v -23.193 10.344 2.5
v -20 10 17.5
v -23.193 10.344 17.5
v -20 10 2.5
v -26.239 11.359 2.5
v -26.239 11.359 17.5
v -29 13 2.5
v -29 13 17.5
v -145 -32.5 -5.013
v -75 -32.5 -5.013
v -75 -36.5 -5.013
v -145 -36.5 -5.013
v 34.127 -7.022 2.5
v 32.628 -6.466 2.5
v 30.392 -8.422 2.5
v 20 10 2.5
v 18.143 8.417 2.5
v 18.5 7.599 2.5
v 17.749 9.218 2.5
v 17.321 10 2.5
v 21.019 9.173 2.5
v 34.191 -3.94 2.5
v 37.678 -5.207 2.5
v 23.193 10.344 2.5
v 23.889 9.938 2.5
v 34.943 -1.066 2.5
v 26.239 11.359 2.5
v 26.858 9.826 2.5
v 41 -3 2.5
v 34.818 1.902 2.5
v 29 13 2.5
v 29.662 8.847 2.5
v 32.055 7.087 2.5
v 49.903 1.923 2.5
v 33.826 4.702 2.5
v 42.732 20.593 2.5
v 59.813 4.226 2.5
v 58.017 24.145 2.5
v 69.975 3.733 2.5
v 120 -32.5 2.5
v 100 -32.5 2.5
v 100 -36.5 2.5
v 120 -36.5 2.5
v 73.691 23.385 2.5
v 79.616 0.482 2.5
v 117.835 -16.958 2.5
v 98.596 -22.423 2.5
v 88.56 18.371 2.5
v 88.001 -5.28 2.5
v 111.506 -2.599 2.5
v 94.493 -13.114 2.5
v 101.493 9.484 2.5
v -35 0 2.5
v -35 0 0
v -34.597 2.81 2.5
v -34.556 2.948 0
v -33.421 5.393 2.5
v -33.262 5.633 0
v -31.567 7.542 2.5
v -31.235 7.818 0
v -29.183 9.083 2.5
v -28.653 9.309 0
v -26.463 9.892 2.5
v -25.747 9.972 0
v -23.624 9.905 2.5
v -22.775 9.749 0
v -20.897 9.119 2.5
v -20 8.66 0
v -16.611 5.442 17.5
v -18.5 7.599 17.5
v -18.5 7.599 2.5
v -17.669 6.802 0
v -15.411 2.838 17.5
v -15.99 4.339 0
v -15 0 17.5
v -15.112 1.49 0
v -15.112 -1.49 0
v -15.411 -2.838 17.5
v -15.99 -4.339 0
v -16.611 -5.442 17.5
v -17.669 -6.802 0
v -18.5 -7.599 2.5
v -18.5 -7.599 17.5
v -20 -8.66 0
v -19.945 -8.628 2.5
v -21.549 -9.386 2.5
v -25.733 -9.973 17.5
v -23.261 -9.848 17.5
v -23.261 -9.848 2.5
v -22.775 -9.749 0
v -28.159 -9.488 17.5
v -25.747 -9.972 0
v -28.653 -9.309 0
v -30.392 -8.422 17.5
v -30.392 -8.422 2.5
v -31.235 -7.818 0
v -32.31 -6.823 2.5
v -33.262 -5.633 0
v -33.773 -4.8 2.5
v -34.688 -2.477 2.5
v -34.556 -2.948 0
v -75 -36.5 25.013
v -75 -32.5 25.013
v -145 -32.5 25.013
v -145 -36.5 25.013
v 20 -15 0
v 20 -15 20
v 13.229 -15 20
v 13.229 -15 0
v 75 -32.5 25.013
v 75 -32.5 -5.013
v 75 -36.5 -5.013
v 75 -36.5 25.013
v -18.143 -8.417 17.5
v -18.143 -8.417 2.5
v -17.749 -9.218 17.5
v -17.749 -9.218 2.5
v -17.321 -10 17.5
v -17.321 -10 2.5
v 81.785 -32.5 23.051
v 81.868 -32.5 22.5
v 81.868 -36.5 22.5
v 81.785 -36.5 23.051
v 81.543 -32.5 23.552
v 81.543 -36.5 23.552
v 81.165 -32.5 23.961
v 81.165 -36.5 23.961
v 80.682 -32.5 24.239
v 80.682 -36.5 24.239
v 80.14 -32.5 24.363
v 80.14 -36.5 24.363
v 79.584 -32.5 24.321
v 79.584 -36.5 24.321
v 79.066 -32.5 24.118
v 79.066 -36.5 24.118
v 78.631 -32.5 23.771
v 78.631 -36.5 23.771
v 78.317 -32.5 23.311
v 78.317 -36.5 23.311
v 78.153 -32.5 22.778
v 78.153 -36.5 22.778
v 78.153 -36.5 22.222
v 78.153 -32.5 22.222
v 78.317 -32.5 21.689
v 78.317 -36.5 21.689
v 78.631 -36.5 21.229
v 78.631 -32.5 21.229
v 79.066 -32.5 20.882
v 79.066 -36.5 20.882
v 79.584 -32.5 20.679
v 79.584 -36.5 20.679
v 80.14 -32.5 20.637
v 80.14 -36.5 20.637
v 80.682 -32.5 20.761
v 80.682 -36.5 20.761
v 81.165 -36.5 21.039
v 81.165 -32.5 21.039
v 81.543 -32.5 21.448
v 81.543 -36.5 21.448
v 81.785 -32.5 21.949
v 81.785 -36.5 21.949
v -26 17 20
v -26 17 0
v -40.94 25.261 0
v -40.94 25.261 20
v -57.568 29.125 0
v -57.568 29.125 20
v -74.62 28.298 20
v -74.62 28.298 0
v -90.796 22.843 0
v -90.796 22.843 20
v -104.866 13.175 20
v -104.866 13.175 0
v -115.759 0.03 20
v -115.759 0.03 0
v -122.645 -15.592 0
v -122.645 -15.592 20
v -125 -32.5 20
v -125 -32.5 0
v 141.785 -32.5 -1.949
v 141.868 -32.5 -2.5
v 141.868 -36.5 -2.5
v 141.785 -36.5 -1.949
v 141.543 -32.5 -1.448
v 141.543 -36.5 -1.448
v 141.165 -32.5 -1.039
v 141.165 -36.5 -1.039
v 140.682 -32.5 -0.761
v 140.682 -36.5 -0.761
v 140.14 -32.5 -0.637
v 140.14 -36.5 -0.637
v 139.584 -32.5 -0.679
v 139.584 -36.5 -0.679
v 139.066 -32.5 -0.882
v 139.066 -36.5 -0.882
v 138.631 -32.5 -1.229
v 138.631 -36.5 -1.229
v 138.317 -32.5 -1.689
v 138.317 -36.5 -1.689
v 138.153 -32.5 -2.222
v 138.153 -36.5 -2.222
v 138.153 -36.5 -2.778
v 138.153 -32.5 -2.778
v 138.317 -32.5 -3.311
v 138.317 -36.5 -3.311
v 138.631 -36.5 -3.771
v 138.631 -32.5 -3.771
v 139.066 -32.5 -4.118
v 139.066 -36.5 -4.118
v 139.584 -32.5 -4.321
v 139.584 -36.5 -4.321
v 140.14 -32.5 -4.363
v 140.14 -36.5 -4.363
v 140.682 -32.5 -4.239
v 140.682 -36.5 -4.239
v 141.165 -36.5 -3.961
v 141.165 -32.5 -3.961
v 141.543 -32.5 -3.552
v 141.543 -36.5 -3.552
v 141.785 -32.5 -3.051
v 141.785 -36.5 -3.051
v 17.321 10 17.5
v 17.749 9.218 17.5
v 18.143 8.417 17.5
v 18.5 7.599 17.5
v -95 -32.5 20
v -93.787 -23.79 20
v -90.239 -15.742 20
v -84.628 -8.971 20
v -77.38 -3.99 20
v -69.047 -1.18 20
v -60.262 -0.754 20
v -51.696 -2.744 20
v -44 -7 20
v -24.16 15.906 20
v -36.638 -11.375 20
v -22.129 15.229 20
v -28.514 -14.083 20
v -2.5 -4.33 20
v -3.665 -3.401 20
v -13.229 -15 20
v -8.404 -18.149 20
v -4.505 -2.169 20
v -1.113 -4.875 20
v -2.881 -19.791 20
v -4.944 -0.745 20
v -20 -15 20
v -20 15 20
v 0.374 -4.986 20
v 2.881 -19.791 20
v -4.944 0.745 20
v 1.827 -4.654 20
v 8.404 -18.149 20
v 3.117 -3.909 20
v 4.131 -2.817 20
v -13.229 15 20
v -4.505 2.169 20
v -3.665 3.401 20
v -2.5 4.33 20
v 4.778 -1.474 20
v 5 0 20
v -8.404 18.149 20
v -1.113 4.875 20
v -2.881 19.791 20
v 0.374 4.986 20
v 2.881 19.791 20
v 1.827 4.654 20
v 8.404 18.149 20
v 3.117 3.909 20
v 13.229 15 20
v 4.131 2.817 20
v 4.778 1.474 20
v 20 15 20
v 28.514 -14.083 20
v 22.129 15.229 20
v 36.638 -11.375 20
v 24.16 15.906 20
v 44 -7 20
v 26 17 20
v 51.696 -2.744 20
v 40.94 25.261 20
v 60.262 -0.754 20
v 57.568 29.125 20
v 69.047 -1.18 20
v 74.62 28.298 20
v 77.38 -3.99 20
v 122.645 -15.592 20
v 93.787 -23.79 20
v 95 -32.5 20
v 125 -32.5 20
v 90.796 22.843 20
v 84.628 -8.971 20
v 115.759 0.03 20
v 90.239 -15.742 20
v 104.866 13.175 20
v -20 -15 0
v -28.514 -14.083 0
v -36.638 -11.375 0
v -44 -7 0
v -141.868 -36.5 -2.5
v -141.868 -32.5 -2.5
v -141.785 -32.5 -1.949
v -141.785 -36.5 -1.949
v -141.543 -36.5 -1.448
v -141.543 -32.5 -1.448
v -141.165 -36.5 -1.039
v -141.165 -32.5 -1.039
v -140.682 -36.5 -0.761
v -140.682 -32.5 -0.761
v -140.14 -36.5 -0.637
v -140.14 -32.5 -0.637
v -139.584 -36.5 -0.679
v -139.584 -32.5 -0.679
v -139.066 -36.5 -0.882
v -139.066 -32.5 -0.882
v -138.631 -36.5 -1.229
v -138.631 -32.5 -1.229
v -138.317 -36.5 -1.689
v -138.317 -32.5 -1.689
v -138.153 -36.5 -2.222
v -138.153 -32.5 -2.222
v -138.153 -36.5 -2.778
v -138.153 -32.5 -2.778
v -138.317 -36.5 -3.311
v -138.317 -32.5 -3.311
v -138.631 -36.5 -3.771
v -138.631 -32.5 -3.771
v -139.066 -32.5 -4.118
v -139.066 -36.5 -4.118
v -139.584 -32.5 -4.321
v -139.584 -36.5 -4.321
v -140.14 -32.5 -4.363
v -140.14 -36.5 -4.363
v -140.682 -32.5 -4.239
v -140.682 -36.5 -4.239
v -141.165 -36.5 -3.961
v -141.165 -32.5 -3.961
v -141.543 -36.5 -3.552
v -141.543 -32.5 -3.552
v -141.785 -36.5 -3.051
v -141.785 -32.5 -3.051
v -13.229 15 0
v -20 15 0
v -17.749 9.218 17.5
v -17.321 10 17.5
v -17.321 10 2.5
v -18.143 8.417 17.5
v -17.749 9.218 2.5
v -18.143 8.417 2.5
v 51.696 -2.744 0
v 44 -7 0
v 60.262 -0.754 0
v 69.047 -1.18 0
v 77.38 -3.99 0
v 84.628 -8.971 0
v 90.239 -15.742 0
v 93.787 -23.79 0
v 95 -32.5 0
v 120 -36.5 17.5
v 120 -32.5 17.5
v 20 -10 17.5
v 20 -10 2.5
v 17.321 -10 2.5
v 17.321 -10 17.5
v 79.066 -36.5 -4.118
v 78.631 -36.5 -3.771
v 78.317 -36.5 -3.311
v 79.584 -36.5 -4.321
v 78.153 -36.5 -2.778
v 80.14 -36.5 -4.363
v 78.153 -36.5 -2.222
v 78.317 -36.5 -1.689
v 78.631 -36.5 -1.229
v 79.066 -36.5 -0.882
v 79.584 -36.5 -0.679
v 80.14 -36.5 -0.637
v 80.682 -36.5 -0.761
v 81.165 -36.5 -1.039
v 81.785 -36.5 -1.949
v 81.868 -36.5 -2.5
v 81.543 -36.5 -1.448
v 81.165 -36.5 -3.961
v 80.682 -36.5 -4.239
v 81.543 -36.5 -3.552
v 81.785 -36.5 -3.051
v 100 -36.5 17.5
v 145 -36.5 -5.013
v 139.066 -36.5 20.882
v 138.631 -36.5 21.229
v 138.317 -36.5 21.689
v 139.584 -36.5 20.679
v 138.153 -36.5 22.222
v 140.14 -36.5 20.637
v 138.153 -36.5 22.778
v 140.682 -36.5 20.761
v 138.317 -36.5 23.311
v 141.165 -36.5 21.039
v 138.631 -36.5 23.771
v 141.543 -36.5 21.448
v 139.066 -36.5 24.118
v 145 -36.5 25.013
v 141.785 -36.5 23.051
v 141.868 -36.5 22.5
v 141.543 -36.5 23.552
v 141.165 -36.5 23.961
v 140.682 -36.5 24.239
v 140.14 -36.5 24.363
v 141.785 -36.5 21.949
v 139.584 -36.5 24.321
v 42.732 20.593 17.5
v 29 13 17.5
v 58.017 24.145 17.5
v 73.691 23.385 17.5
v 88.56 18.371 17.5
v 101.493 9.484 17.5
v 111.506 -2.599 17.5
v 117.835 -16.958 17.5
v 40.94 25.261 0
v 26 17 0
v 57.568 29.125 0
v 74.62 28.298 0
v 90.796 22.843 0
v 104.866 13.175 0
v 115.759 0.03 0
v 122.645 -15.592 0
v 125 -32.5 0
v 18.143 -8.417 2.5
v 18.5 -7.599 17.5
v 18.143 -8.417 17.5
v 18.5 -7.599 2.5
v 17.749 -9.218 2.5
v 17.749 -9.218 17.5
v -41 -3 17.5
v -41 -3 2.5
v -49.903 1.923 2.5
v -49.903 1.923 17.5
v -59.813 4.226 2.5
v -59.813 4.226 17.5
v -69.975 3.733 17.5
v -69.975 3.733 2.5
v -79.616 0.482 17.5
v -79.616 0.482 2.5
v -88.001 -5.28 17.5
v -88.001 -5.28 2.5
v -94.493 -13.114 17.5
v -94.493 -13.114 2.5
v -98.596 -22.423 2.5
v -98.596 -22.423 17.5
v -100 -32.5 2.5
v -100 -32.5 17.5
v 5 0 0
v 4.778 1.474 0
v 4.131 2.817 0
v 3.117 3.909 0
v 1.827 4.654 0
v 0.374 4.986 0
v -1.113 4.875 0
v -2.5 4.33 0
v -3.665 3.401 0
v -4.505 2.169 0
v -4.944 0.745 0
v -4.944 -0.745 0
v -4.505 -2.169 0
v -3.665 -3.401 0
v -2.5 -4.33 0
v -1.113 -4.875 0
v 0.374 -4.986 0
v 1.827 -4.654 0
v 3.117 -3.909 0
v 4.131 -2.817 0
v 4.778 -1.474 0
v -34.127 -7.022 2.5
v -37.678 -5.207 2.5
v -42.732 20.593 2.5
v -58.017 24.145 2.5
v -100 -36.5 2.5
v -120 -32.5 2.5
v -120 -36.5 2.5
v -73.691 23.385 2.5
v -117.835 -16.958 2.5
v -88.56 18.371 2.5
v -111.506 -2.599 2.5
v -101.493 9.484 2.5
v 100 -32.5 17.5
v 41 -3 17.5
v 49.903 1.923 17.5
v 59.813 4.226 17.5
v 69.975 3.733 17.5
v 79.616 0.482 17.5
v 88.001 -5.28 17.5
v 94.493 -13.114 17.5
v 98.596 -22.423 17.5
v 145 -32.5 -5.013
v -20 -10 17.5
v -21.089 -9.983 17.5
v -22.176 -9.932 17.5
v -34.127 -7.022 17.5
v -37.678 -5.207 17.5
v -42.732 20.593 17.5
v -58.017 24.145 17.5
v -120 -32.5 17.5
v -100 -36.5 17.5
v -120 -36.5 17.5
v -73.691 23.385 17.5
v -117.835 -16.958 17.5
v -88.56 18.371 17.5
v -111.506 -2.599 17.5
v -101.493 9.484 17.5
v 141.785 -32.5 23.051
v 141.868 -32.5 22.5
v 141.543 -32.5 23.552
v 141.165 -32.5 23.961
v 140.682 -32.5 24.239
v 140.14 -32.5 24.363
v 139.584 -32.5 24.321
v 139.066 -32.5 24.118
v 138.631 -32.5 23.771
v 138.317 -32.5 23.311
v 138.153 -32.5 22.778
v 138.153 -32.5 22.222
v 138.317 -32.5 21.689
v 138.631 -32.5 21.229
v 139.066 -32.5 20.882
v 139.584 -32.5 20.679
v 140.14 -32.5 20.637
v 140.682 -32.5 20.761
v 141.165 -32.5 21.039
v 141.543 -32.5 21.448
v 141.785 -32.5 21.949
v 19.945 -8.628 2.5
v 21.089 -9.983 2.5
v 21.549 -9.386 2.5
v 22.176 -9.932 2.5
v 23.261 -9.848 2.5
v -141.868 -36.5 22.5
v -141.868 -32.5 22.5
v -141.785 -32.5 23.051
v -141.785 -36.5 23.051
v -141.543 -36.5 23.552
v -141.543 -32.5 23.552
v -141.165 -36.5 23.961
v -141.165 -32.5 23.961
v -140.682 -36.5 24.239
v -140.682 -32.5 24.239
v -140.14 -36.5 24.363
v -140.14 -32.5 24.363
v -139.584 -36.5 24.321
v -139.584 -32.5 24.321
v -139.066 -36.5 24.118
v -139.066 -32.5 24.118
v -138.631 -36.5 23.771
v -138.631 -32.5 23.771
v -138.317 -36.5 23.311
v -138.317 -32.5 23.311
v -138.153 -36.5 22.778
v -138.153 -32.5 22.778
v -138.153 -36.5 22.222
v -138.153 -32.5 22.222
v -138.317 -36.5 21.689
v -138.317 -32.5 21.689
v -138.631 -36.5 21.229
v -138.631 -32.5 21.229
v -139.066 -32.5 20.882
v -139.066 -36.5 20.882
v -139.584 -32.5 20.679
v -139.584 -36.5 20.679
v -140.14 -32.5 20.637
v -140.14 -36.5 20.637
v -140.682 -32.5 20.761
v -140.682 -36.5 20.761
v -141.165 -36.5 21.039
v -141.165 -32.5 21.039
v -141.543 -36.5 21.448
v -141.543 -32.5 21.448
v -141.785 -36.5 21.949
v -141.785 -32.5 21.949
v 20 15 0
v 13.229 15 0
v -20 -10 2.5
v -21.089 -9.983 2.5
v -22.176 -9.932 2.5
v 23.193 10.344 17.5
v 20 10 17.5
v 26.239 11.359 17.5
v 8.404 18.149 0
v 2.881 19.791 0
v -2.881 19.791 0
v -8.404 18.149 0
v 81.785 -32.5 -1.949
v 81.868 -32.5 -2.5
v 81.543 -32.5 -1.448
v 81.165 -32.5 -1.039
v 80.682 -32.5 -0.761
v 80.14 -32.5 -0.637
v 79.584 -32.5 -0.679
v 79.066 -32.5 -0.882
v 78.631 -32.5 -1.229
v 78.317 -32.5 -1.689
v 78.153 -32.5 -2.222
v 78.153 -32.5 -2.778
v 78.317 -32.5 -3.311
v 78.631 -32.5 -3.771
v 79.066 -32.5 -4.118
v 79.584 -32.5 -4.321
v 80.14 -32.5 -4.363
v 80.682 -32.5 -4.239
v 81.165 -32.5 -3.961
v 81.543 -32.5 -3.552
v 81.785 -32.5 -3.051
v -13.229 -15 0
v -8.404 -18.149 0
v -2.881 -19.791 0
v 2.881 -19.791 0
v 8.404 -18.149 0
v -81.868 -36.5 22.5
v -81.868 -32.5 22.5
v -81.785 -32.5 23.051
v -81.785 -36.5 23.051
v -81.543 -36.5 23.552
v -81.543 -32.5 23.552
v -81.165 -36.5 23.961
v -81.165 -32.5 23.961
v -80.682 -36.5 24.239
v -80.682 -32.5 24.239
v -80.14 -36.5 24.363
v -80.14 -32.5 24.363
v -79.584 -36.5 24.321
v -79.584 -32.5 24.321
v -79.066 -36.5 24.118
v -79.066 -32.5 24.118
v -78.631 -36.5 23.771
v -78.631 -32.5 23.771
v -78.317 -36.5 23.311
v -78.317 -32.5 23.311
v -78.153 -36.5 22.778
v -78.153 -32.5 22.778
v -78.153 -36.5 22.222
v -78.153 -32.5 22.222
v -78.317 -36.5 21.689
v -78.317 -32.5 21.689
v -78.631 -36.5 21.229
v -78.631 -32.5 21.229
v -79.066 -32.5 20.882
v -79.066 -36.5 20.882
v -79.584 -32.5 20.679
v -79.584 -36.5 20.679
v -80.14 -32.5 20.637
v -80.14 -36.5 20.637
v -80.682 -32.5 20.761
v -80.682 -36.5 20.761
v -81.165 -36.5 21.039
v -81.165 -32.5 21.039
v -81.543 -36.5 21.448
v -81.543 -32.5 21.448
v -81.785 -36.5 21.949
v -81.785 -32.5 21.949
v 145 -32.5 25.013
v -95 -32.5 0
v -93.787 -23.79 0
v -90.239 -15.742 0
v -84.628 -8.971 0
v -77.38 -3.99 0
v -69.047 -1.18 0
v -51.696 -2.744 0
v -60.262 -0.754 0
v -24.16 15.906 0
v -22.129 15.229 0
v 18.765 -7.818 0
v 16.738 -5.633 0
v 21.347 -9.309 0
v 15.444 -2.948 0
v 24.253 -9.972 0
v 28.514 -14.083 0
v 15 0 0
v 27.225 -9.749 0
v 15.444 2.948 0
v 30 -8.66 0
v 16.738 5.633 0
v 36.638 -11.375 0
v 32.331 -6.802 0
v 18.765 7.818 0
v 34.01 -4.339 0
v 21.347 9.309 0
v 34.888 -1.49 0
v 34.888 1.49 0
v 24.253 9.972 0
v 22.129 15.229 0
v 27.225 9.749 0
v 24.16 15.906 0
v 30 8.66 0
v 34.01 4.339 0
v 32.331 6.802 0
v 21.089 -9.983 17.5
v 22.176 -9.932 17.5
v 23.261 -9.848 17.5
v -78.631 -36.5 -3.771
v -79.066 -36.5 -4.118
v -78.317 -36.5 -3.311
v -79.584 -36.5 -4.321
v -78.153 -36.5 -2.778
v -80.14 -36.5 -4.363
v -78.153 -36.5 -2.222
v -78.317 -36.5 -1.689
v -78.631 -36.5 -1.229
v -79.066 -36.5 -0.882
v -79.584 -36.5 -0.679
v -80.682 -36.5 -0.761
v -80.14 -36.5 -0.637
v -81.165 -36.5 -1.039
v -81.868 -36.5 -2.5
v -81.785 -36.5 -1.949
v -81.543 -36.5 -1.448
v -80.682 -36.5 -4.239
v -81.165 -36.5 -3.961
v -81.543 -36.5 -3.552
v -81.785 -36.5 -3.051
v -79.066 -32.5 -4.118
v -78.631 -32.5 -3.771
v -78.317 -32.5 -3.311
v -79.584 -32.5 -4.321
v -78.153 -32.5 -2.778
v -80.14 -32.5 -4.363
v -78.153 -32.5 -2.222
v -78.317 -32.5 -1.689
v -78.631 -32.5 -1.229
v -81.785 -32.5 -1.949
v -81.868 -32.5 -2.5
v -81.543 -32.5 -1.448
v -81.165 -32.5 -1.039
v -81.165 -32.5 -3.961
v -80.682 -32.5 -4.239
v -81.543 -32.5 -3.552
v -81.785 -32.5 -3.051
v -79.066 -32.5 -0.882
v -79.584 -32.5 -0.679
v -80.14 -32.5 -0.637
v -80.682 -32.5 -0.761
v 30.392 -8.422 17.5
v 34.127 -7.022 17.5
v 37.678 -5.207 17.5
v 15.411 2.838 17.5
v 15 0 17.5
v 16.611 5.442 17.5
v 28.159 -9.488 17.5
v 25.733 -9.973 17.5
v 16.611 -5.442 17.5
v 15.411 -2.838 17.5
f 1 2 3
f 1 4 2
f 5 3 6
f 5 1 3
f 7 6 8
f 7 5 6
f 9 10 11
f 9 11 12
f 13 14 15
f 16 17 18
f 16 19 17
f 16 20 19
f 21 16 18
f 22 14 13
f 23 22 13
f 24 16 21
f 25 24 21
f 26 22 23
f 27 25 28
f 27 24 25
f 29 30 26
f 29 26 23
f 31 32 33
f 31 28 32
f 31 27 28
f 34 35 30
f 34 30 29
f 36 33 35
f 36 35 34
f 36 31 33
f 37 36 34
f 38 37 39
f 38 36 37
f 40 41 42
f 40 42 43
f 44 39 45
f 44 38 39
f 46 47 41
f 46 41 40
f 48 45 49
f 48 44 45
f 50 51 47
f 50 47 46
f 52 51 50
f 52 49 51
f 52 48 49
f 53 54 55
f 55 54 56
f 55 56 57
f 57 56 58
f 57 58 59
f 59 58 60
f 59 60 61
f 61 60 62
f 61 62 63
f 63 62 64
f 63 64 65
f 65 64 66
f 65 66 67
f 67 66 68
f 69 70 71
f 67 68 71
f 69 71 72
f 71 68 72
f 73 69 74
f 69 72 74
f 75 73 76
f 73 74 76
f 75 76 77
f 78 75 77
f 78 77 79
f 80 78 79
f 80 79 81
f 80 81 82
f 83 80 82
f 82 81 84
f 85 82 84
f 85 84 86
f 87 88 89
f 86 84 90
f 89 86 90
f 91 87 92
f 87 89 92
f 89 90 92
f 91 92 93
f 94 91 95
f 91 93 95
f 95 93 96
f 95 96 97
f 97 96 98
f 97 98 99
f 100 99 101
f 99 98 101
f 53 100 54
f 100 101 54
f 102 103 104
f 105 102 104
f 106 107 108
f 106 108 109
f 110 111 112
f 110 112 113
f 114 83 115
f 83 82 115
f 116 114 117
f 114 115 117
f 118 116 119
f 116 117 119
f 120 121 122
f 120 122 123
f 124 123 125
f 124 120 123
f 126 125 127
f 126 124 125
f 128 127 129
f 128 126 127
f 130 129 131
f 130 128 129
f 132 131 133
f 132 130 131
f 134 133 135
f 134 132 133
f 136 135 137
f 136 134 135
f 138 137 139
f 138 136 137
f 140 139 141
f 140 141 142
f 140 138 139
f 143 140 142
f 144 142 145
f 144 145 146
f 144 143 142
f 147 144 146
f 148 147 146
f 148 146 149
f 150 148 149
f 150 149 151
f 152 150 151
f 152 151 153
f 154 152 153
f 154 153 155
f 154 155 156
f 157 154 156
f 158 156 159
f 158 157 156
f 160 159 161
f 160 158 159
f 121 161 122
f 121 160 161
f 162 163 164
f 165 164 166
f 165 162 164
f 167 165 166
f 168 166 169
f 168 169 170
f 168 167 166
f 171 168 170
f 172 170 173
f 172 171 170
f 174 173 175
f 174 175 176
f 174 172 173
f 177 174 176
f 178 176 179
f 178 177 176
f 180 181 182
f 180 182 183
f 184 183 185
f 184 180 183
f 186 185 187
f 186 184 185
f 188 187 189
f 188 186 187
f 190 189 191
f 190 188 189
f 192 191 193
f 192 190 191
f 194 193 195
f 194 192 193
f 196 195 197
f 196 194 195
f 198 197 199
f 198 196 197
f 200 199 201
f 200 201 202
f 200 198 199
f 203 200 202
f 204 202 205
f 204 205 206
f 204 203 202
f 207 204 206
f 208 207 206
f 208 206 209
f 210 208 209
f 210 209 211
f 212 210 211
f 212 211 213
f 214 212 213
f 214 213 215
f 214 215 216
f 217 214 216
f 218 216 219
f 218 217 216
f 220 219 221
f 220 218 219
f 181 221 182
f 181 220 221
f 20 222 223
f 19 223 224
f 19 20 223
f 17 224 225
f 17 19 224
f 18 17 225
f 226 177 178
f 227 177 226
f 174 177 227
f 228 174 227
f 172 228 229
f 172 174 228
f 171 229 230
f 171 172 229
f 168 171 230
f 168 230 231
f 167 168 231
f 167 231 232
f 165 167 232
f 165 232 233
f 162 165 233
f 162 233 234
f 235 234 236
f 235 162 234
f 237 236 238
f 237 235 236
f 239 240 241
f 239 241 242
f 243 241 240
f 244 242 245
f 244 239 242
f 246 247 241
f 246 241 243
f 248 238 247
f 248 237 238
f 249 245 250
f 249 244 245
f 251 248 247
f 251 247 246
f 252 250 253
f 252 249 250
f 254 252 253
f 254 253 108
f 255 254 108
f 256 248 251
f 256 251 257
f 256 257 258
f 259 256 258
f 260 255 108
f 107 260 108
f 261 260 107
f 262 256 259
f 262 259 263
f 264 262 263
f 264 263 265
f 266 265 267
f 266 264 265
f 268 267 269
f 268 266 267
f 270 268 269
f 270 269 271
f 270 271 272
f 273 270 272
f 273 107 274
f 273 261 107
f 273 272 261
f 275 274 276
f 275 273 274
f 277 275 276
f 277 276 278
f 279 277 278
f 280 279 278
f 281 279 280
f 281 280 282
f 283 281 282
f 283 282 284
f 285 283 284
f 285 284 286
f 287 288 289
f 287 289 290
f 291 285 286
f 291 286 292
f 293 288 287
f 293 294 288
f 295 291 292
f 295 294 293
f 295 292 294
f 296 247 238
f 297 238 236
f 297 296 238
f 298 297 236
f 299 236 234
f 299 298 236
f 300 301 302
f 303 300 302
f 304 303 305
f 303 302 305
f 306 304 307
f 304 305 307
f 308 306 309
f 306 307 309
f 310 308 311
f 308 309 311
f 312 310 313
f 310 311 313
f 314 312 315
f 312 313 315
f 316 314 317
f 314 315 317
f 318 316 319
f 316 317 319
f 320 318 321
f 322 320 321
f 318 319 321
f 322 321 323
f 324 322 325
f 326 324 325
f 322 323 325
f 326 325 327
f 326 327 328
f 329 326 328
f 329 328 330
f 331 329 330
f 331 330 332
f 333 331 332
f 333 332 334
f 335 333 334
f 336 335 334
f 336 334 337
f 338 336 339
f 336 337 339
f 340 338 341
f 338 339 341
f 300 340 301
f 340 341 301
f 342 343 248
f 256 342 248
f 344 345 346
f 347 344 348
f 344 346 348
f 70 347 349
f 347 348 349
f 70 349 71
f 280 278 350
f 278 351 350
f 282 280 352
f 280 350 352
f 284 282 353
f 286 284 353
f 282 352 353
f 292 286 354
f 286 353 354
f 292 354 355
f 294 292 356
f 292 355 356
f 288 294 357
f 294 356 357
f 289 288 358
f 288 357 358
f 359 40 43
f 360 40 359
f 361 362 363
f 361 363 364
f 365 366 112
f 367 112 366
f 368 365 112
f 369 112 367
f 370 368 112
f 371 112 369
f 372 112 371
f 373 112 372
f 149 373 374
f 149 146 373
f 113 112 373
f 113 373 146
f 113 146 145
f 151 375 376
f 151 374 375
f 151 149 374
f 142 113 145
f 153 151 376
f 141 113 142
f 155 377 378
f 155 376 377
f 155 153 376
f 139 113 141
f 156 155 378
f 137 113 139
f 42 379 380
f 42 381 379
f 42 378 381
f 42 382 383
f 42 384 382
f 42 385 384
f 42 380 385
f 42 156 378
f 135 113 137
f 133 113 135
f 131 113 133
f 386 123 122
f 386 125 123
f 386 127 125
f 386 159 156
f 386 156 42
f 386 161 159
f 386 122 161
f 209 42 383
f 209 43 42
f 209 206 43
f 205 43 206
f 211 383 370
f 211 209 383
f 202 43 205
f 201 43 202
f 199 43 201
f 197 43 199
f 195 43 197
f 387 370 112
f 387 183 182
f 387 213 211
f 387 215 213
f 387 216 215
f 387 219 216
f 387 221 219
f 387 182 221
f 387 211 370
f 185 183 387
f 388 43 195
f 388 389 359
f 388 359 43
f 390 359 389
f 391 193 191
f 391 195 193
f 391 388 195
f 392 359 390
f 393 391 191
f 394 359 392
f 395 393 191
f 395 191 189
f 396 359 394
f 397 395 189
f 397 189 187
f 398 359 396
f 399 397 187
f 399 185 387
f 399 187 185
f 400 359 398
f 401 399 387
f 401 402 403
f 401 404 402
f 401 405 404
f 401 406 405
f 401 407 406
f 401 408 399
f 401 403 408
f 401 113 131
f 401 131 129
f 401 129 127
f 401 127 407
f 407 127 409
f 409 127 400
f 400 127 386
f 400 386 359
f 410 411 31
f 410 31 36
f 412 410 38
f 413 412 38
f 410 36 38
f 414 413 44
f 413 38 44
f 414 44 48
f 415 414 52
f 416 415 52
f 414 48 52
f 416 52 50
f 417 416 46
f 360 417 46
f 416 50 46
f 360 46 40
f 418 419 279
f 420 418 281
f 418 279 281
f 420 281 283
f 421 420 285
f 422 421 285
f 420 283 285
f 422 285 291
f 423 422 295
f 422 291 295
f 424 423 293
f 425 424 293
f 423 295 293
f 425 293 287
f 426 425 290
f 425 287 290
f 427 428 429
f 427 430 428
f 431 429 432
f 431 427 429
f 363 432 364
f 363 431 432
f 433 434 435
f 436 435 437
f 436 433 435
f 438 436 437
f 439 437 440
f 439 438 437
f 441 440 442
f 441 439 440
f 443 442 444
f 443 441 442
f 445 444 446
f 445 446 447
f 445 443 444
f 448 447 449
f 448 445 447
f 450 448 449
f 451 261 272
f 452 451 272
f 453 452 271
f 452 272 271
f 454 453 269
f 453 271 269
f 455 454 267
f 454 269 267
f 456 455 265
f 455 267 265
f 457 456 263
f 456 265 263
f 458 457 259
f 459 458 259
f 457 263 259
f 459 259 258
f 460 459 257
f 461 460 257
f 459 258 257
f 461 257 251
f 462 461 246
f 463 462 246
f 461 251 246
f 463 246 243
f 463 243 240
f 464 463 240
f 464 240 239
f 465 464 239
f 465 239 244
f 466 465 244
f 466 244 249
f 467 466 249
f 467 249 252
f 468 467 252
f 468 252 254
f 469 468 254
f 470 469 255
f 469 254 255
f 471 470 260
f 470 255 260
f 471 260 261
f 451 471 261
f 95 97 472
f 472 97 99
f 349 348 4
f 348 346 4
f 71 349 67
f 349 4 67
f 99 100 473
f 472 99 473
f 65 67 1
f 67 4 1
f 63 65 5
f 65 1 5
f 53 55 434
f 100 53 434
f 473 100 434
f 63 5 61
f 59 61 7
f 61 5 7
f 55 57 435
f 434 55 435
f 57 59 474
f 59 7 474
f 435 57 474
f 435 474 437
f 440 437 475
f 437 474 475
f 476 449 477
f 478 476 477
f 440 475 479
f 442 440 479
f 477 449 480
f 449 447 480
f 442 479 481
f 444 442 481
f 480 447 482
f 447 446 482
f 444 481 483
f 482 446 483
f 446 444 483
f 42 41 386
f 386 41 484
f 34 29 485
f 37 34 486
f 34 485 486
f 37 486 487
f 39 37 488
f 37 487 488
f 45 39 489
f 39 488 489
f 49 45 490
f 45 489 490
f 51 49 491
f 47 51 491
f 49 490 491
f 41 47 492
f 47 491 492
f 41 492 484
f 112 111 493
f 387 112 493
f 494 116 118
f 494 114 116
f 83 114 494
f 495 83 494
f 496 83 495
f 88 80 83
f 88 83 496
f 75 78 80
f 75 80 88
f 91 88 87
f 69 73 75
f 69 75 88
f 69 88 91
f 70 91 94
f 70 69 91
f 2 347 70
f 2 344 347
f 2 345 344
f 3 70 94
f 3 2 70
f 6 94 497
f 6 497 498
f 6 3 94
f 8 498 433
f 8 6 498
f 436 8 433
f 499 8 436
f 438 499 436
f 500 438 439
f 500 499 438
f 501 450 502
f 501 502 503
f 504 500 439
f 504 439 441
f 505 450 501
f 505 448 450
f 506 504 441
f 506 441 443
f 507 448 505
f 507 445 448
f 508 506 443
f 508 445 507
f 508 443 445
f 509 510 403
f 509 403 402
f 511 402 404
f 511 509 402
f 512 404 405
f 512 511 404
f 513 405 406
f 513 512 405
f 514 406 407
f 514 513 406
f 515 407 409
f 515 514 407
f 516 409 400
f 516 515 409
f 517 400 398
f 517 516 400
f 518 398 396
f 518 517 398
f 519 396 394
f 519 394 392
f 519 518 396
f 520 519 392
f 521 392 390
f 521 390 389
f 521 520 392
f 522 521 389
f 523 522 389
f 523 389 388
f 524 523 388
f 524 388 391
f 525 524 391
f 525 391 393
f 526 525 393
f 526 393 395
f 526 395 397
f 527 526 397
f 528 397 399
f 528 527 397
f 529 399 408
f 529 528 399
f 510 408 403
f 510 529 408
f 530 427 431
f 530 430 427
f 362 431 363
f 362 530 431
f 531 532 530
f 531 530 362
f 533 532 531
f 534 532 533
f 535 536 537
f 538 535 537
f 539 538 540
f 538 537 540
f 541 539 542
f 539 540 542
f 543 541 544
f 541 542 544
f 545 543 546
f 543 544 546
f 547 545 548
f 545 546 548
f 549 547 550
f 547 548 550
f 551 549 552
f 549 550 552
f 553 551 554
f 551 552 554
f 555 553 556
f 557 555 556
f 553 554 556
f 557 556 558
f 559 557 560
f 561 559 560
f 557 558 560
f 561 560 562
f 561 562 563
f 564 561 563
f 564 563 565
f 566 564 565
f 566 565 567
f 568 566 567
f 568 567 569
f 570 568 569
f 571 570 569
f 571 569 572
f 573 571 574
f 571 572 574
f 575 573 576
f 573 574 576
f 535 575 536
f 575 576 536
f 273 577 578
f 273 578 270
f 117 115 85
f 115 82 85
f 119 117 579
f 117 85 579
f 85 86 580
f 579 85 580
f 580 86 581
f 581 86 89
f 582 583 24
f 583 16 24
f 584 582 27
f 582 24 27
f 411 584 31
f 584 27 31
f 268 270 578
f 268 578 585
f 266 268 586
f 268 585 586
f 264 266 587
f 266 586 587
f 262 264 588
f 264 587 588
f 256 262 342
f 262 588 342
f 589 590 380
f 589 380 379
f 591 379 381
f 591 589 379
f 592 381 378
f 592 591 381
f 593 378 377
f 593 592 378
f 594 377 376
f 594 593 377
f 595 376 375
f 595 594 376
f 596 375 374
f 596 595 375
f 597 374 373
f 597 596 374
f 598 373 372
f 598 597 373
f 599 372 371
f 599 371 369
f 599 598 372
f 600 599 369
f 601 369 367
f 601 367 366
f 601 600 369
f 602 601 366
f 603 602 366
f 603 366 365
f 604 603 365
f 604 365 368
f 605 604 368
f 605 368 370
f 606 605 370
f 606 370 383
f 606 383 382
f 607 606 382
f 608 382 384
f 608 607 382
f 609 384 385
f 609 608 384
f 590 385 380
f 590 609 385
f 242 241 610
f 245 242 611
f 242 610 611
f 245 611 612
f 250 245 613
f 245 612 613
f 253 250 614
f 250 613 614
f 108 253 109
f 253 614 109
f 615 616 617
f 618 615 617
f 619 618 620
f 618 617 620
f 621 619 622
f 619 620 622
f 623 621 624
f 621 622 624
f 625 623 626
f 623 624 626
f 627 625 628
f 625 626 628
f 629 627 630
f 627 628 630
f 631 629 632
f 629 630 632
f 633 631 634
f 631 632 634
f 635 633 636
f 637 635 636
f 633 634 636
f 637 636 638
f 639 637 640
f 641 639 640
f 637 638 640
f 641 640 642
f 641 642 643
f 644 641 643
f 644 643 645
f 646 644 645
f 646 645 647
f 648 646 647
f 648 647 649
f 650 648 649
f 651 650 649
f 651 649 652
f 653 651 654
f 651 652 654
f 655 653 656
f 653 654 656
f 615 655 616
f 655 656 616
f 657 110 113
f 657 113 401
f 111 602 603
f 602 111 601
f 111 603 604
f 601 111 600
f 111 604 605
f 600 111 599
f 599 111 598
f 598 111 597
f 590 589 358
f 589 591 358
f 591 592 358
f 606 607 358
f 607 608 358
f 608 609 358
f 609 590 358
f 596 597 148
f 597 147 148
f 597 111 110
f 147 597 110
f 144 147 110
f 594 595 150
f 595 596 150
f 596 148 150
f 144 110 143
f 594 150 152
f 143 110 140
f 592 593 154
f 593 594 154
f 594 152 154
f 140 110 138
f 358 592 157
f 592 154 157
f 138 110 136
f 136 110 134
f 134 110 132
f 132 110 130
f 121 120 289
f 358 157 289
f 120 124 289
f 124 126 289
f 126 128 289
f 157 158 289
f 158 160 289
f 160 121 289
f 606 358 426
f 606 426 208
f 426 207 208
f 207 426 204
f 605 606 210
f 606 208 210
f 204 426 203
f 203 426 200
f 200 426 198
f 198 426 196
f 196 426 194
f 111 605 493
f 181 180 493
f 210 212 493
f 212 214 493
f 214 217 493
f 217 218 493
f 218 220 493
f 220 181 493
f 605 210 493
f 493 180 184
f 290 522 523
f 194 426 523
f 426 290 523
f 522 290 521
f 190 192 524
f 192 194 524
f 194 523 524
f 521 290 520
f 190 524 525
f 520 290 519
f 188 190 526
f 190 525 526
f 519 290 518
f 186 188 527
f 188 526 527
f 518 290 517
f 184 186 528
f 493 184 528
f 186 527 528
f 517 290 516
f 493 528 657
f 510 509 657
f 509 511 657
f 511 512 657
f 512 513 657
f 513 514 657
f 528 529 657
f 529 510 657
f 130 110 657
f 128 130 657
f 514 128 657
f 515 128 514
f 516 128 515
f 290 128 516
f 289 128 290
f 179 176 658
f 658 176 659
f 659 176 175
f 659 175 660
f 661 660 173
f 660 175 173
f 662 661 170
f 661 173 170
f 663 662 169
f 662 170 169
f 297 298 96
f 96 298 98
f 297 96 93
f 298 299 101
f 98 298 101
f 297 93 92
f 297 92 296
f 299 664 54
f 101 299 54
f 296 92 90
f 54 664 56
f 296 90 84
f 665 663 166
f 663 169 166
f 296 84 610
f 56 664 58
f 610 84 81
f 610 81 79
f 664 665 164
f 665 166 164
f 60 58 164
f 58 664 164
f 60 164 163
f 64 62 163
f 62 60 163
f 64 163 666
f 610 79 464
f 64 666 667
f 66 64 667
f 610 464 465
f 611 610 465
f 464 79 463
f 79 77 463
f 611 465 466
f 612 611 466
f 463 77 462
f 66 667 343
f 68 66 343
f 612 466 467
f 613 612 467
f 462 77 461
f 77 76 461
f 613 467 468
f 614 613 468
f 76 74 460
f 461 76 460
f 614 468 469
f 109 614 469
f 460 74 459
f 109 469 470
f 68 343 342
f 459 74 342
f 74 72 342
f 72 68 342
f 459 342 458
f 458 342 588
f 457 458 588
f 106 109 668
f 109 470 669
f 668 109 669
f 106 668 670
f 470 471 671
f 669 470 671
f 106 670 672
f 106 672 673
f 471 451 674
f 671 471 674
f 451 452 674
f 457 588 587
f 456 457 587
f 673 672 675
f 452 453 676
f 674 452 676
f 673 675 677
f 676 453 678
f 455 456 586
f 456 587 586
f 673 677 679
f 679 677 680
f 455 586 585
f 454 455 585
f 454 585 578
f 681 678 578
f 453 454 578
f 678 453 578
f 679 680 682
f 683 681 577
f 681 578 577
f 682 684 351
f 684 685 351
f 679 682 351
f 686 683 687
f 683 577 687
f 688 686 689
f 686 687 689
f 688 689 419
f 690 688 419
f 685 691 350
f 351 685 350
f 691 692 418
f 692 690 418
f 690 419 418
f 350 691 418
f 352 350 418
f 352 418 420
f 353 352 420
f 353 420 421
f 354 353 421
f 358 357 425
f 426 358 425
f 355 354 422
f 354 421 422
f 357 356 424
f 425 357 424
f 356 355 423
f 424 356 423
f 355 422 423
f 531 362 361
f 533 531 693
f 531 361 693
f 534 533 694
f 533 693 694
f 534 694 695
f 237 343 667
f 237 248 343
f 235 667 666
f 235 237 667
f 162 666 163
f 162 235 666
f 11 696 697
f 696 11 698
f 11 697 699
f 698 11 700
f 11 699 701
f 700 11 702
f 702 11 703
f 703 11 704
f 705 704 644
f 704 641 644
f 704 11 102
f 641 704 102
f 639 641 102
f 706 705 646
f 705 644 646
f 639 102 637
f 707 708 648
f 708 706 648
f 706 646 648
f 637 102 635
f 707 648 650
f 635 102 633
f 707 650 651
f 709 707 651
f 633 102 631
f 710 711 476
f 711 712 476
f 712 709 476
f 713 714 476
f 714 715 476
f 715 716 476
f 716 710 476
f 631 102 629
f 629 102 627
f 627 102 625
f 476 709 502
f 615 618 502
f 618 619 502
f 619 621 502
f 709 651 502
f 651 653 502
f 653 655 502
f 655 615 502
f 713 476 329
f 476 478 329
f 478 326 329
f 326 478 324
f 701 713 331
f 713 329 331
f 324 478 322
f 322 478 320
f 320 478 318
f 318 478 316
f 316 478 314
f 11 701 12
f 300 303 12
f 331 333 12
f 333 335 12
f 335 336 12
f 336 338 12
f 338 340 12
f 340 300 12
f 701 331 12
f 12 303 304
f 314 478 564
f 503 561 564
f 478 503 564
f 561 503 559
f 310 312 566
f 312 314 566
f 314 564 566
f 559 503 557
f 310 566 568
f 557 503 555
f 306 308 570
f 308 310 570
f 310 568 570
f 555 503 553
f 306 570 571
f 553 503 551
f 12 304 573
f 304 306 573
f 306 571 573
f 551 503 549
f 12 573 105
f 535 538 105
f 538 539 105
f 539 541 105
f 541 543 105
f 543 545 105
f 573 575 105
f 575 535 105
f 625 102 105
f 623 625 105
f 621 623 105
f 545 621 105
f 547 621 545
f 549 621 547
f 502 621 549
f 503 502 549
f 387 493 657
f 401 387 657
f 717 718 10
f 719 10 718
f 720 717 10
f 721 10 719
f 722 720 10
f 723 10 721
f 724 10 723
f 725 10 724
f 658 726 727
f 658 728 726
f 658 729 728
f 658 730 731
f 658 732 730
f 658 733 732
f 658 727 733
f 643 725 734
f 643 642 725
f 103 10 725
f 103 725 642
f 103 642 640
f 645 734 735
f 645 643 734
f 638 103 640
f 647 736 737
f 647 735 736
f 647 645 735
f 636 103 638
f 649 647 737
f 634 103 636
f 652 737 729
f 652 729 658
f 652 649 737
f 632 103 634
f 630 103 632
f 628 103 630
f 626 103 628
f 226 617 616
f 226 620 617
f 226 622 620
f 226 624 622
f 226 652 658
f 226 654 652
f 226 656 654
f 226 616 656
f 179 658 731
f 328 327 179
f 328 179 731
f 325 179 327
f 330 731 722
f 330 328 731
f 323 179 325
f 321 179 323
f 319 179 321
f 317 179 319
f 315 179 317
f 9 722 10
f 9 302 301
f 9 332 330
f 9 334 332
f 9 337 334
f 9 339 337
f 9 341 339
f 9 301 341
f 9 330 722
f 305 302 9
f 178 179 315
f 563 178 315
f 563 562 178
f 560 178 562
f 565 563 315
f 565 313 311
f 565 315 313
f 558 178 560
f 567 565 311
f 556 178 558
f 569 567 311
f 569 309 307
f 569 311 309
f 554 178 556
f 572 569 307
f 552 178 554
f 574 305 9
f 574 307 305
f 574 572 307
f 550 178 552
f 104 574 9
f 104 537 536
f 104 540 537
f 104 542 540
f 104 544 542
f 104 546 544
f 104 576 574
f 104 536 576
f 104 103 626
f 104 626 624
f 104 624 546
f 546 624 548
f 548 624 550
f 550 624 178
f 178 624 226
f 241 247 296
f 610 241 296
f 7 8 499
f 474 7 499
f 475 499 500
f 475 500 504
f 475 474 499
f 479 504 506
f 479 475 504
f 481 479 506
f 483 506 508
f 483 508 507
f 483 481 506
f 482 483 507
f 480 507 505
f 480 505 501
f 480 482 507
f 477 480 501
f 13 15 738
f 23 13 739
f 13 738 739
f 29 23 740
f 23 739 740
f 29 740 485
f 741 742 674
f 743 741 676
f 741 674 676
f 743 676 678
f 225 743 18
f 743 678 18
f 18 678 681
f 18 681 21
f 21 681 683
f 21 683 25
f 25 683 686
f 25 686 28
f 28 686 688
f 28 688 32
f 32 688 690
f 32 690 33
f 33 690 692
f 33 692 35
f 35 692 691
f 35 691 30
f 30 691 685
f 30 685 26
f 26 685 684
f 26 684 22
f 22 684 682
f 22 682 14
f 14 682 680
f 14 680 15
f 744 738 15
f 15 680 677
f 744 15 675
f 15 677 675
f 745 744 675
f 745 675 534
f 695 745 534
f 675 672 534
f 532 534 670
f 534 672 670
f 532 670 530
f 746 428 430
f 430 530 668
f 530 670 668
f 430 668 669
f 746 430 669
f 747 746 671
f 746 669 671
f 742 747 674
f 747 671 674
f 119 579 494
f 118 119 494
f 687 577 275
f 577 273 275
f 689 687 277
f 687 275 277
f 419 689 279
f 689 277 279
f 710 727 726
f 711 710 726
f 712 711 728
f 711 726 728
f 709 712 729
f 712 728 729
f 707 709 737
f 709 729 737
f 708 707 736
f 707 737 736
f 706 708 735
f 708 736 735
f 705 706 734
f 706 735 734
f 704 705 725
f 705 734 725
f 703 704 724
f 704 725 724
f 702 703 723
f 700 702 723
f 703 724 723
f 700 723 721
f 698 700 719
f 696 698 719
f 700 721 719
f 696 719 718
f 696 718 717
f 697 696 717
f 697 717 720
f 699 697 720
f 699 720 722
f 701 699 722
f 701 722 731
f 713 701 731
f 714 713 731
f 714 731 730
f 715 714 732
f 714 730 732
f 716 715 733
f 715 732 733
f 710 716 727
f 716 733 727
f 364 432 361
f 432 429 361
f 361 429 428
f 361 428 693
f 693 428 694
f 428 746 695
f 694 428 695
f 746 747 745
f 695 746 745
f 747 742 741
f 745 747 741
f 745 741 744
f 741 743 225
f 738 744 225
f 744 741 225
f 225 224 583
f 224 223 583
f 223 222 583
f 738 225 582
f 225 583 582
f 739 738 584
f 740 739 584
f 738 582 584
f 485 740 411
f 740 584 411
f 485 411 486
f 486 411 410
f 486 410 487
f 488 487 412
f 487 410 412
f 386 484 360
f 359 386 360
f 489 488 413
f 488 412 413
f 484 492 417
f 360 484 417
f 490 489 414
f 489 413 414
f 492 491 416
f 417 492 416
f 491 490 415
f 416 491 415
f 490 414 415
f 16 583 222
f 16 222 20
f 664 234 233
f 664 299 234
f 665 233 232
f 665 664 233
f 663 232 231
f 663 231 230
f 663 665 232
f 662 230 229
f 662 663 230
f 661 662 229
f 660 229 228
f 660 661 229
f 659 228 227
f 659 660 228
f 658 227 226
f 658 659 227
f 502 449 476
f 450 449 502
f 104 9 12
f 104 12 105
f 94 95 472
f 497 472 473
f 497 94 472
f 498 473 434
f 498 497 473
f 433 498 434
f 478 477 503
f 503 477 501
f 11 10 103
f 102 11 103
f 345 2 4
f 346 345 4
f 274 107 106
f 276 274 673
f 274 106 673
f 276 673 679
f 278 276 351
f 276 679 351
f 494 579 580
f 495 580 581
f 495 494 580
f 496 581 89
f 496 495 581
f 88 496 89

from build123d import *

# Parameters (mm, degrees)
SKETCH1_R               = 20
SKETCH1_R_2             = 5
BOSS_EXTRUDE1_DEPTH     = 20
SKETCH3_W               = 20
SKETCH3_H               = 30
SKETCH3_W_2             = 15
SKETCH3_H_2             = 20
SKETCH4_R               = 5
CUT_EXTRUDE1_DEPTH      = 1
CUT_EXTRUDE1_DEPTH_BACK = 21
SKETCH5_R               = 10
CUT_EXTRUDE2_DEPTH      = 1
CUT_EXTRUDE2_DEPTH_BACK = 17.5
SKETCH6_W               = 70
SKETCH6_H               = 30.026464272
SKETCH6_R               = 1.868076344
SKETCH6_W_2             = 20
SKETCH6_H_2             = 15
BOSS_EXTRUDE2_DEPTH     = 4


with BuildPart() as part:
    # Sketch1 → Boss-Extrude1 (new body)
    with BuildSketch(Plane.XY):
        Circle(SKETCH1_R)
        Circle(SKETCH1_R_2, mode=Mode.SUBTRACT)
    extrude(amount=BOSS_EXTRUDE1_DEPTH)

    # Sweep1: sweep along a path in Sketch2
    with BuildLine(Plane.XY) as sweep1_path:
        Line((0, 0), (-20, 0))
        ThreePointArc((-20, 0), (-27.90569415, 1.282917549), (-35, 5))
        ThreePointArc((-35, 5), (-84.088137289, 9.426274578), (-110, -32.5))
    # Sketch3 → Sweep1 (sweep)
    with BuildSketch(Plane(origin=(0, 0, 0), x_dir=(0, 0, -1), z_dir=(1, 0, 0))):
        with Locations((-10, 0)):
            Rectangle(SKETCH3_W, SKETCH3_H)
        with Locations((-10, 0)):
            Rectangle(SKETCH3_W_2, SKETCH3_H_2, mode=Mode.SUBTRACT)
    sweep(path=sweep1_path.line)

    # Mirror1: part across plane


with BuildPart() as part_1:
    add(part.part)
    add(part.part.mirror(Plane(origin=(0, 0, 0), x_dir=(0, 0, 1), z_dir=(1, 0, 0))))

    # Sketch4 → Cut-Extrude1 (cut, two sides)
    with BuildSketch(Plane.XY.offset(20)) as cut_extrude1_sk:
        Circle(SKETCH4_R)
    extrude(amount=CUT_EXTRUDE1_DEPTH, mode=Mode.SUBTRACT)
    extrude(cut_extrude1_sk.sketch, amount=-CUT_EXTRUDE1_DEPTH_BACK, mode=Mode.SUBTRACT)

    # Sketch5 → Cut-Extrude2 (cut, two sides)
    with BuildSketch(Plane(origin=(0, 0, 0), x_dir=(-1, 0, 0), z_dir=(0, 0, -1))) as cut_extrude2_sk:
        with Locations((-25, 0)):
            Circle(SKETCH5_R)
        with Locations((25, 0)):
            Circle(SKETCH5_R)
    extrude(amount=CUT_EXTRUDE2_DEPTH, mode=Mode.SUBTRACT)
    extrude(cut_extrude2_sk.sketch, amount=-CUT_EXTRUDE2_DEPTH_BACK, mode=Mode.SUBTRACT)

    # Sketch6 → Boss-Extrude2 (add)
    with BuildSketch(Plane.XZ.offset(32.5)):
        with Locations((110, 10)):
            Rectangle(SKETCH6_W, SKETCH6_H)
        with Locations((80, 22.5)):
            Circle(SKETCH6_R, mode=Mode.SUBTRACT)
        with Locations((140, 22.5)):
            Circle(SKETCH6_R, mode=Mode.SUBTRACT)
        with Locations((140, -2.5)):
            Circle(SKETCH6_R, mode=Mode.SUBTRACT)
        with Locations((80, -2.5)):
            Circle(SKETCH6_R, mode=Mode.SUBTRACT)
        with Locations((110, 10)):
            Rectangle(SKETCH6_W_2, SKETCH6_H_2, mode=Mode.SUBTRACT)
    extrude(amount=BOSS_EXTRUDE2_DEPTH)

    # Mirror2: part across plane


with BuildPart() as part_2:
    add(part_1.part)
    add(part_1.part.mirror(Plane(origin=(0, 0, 0), x_dir=(0, 0, 1), z_dir=(1, 0, 0))))


solid = part_2.part
